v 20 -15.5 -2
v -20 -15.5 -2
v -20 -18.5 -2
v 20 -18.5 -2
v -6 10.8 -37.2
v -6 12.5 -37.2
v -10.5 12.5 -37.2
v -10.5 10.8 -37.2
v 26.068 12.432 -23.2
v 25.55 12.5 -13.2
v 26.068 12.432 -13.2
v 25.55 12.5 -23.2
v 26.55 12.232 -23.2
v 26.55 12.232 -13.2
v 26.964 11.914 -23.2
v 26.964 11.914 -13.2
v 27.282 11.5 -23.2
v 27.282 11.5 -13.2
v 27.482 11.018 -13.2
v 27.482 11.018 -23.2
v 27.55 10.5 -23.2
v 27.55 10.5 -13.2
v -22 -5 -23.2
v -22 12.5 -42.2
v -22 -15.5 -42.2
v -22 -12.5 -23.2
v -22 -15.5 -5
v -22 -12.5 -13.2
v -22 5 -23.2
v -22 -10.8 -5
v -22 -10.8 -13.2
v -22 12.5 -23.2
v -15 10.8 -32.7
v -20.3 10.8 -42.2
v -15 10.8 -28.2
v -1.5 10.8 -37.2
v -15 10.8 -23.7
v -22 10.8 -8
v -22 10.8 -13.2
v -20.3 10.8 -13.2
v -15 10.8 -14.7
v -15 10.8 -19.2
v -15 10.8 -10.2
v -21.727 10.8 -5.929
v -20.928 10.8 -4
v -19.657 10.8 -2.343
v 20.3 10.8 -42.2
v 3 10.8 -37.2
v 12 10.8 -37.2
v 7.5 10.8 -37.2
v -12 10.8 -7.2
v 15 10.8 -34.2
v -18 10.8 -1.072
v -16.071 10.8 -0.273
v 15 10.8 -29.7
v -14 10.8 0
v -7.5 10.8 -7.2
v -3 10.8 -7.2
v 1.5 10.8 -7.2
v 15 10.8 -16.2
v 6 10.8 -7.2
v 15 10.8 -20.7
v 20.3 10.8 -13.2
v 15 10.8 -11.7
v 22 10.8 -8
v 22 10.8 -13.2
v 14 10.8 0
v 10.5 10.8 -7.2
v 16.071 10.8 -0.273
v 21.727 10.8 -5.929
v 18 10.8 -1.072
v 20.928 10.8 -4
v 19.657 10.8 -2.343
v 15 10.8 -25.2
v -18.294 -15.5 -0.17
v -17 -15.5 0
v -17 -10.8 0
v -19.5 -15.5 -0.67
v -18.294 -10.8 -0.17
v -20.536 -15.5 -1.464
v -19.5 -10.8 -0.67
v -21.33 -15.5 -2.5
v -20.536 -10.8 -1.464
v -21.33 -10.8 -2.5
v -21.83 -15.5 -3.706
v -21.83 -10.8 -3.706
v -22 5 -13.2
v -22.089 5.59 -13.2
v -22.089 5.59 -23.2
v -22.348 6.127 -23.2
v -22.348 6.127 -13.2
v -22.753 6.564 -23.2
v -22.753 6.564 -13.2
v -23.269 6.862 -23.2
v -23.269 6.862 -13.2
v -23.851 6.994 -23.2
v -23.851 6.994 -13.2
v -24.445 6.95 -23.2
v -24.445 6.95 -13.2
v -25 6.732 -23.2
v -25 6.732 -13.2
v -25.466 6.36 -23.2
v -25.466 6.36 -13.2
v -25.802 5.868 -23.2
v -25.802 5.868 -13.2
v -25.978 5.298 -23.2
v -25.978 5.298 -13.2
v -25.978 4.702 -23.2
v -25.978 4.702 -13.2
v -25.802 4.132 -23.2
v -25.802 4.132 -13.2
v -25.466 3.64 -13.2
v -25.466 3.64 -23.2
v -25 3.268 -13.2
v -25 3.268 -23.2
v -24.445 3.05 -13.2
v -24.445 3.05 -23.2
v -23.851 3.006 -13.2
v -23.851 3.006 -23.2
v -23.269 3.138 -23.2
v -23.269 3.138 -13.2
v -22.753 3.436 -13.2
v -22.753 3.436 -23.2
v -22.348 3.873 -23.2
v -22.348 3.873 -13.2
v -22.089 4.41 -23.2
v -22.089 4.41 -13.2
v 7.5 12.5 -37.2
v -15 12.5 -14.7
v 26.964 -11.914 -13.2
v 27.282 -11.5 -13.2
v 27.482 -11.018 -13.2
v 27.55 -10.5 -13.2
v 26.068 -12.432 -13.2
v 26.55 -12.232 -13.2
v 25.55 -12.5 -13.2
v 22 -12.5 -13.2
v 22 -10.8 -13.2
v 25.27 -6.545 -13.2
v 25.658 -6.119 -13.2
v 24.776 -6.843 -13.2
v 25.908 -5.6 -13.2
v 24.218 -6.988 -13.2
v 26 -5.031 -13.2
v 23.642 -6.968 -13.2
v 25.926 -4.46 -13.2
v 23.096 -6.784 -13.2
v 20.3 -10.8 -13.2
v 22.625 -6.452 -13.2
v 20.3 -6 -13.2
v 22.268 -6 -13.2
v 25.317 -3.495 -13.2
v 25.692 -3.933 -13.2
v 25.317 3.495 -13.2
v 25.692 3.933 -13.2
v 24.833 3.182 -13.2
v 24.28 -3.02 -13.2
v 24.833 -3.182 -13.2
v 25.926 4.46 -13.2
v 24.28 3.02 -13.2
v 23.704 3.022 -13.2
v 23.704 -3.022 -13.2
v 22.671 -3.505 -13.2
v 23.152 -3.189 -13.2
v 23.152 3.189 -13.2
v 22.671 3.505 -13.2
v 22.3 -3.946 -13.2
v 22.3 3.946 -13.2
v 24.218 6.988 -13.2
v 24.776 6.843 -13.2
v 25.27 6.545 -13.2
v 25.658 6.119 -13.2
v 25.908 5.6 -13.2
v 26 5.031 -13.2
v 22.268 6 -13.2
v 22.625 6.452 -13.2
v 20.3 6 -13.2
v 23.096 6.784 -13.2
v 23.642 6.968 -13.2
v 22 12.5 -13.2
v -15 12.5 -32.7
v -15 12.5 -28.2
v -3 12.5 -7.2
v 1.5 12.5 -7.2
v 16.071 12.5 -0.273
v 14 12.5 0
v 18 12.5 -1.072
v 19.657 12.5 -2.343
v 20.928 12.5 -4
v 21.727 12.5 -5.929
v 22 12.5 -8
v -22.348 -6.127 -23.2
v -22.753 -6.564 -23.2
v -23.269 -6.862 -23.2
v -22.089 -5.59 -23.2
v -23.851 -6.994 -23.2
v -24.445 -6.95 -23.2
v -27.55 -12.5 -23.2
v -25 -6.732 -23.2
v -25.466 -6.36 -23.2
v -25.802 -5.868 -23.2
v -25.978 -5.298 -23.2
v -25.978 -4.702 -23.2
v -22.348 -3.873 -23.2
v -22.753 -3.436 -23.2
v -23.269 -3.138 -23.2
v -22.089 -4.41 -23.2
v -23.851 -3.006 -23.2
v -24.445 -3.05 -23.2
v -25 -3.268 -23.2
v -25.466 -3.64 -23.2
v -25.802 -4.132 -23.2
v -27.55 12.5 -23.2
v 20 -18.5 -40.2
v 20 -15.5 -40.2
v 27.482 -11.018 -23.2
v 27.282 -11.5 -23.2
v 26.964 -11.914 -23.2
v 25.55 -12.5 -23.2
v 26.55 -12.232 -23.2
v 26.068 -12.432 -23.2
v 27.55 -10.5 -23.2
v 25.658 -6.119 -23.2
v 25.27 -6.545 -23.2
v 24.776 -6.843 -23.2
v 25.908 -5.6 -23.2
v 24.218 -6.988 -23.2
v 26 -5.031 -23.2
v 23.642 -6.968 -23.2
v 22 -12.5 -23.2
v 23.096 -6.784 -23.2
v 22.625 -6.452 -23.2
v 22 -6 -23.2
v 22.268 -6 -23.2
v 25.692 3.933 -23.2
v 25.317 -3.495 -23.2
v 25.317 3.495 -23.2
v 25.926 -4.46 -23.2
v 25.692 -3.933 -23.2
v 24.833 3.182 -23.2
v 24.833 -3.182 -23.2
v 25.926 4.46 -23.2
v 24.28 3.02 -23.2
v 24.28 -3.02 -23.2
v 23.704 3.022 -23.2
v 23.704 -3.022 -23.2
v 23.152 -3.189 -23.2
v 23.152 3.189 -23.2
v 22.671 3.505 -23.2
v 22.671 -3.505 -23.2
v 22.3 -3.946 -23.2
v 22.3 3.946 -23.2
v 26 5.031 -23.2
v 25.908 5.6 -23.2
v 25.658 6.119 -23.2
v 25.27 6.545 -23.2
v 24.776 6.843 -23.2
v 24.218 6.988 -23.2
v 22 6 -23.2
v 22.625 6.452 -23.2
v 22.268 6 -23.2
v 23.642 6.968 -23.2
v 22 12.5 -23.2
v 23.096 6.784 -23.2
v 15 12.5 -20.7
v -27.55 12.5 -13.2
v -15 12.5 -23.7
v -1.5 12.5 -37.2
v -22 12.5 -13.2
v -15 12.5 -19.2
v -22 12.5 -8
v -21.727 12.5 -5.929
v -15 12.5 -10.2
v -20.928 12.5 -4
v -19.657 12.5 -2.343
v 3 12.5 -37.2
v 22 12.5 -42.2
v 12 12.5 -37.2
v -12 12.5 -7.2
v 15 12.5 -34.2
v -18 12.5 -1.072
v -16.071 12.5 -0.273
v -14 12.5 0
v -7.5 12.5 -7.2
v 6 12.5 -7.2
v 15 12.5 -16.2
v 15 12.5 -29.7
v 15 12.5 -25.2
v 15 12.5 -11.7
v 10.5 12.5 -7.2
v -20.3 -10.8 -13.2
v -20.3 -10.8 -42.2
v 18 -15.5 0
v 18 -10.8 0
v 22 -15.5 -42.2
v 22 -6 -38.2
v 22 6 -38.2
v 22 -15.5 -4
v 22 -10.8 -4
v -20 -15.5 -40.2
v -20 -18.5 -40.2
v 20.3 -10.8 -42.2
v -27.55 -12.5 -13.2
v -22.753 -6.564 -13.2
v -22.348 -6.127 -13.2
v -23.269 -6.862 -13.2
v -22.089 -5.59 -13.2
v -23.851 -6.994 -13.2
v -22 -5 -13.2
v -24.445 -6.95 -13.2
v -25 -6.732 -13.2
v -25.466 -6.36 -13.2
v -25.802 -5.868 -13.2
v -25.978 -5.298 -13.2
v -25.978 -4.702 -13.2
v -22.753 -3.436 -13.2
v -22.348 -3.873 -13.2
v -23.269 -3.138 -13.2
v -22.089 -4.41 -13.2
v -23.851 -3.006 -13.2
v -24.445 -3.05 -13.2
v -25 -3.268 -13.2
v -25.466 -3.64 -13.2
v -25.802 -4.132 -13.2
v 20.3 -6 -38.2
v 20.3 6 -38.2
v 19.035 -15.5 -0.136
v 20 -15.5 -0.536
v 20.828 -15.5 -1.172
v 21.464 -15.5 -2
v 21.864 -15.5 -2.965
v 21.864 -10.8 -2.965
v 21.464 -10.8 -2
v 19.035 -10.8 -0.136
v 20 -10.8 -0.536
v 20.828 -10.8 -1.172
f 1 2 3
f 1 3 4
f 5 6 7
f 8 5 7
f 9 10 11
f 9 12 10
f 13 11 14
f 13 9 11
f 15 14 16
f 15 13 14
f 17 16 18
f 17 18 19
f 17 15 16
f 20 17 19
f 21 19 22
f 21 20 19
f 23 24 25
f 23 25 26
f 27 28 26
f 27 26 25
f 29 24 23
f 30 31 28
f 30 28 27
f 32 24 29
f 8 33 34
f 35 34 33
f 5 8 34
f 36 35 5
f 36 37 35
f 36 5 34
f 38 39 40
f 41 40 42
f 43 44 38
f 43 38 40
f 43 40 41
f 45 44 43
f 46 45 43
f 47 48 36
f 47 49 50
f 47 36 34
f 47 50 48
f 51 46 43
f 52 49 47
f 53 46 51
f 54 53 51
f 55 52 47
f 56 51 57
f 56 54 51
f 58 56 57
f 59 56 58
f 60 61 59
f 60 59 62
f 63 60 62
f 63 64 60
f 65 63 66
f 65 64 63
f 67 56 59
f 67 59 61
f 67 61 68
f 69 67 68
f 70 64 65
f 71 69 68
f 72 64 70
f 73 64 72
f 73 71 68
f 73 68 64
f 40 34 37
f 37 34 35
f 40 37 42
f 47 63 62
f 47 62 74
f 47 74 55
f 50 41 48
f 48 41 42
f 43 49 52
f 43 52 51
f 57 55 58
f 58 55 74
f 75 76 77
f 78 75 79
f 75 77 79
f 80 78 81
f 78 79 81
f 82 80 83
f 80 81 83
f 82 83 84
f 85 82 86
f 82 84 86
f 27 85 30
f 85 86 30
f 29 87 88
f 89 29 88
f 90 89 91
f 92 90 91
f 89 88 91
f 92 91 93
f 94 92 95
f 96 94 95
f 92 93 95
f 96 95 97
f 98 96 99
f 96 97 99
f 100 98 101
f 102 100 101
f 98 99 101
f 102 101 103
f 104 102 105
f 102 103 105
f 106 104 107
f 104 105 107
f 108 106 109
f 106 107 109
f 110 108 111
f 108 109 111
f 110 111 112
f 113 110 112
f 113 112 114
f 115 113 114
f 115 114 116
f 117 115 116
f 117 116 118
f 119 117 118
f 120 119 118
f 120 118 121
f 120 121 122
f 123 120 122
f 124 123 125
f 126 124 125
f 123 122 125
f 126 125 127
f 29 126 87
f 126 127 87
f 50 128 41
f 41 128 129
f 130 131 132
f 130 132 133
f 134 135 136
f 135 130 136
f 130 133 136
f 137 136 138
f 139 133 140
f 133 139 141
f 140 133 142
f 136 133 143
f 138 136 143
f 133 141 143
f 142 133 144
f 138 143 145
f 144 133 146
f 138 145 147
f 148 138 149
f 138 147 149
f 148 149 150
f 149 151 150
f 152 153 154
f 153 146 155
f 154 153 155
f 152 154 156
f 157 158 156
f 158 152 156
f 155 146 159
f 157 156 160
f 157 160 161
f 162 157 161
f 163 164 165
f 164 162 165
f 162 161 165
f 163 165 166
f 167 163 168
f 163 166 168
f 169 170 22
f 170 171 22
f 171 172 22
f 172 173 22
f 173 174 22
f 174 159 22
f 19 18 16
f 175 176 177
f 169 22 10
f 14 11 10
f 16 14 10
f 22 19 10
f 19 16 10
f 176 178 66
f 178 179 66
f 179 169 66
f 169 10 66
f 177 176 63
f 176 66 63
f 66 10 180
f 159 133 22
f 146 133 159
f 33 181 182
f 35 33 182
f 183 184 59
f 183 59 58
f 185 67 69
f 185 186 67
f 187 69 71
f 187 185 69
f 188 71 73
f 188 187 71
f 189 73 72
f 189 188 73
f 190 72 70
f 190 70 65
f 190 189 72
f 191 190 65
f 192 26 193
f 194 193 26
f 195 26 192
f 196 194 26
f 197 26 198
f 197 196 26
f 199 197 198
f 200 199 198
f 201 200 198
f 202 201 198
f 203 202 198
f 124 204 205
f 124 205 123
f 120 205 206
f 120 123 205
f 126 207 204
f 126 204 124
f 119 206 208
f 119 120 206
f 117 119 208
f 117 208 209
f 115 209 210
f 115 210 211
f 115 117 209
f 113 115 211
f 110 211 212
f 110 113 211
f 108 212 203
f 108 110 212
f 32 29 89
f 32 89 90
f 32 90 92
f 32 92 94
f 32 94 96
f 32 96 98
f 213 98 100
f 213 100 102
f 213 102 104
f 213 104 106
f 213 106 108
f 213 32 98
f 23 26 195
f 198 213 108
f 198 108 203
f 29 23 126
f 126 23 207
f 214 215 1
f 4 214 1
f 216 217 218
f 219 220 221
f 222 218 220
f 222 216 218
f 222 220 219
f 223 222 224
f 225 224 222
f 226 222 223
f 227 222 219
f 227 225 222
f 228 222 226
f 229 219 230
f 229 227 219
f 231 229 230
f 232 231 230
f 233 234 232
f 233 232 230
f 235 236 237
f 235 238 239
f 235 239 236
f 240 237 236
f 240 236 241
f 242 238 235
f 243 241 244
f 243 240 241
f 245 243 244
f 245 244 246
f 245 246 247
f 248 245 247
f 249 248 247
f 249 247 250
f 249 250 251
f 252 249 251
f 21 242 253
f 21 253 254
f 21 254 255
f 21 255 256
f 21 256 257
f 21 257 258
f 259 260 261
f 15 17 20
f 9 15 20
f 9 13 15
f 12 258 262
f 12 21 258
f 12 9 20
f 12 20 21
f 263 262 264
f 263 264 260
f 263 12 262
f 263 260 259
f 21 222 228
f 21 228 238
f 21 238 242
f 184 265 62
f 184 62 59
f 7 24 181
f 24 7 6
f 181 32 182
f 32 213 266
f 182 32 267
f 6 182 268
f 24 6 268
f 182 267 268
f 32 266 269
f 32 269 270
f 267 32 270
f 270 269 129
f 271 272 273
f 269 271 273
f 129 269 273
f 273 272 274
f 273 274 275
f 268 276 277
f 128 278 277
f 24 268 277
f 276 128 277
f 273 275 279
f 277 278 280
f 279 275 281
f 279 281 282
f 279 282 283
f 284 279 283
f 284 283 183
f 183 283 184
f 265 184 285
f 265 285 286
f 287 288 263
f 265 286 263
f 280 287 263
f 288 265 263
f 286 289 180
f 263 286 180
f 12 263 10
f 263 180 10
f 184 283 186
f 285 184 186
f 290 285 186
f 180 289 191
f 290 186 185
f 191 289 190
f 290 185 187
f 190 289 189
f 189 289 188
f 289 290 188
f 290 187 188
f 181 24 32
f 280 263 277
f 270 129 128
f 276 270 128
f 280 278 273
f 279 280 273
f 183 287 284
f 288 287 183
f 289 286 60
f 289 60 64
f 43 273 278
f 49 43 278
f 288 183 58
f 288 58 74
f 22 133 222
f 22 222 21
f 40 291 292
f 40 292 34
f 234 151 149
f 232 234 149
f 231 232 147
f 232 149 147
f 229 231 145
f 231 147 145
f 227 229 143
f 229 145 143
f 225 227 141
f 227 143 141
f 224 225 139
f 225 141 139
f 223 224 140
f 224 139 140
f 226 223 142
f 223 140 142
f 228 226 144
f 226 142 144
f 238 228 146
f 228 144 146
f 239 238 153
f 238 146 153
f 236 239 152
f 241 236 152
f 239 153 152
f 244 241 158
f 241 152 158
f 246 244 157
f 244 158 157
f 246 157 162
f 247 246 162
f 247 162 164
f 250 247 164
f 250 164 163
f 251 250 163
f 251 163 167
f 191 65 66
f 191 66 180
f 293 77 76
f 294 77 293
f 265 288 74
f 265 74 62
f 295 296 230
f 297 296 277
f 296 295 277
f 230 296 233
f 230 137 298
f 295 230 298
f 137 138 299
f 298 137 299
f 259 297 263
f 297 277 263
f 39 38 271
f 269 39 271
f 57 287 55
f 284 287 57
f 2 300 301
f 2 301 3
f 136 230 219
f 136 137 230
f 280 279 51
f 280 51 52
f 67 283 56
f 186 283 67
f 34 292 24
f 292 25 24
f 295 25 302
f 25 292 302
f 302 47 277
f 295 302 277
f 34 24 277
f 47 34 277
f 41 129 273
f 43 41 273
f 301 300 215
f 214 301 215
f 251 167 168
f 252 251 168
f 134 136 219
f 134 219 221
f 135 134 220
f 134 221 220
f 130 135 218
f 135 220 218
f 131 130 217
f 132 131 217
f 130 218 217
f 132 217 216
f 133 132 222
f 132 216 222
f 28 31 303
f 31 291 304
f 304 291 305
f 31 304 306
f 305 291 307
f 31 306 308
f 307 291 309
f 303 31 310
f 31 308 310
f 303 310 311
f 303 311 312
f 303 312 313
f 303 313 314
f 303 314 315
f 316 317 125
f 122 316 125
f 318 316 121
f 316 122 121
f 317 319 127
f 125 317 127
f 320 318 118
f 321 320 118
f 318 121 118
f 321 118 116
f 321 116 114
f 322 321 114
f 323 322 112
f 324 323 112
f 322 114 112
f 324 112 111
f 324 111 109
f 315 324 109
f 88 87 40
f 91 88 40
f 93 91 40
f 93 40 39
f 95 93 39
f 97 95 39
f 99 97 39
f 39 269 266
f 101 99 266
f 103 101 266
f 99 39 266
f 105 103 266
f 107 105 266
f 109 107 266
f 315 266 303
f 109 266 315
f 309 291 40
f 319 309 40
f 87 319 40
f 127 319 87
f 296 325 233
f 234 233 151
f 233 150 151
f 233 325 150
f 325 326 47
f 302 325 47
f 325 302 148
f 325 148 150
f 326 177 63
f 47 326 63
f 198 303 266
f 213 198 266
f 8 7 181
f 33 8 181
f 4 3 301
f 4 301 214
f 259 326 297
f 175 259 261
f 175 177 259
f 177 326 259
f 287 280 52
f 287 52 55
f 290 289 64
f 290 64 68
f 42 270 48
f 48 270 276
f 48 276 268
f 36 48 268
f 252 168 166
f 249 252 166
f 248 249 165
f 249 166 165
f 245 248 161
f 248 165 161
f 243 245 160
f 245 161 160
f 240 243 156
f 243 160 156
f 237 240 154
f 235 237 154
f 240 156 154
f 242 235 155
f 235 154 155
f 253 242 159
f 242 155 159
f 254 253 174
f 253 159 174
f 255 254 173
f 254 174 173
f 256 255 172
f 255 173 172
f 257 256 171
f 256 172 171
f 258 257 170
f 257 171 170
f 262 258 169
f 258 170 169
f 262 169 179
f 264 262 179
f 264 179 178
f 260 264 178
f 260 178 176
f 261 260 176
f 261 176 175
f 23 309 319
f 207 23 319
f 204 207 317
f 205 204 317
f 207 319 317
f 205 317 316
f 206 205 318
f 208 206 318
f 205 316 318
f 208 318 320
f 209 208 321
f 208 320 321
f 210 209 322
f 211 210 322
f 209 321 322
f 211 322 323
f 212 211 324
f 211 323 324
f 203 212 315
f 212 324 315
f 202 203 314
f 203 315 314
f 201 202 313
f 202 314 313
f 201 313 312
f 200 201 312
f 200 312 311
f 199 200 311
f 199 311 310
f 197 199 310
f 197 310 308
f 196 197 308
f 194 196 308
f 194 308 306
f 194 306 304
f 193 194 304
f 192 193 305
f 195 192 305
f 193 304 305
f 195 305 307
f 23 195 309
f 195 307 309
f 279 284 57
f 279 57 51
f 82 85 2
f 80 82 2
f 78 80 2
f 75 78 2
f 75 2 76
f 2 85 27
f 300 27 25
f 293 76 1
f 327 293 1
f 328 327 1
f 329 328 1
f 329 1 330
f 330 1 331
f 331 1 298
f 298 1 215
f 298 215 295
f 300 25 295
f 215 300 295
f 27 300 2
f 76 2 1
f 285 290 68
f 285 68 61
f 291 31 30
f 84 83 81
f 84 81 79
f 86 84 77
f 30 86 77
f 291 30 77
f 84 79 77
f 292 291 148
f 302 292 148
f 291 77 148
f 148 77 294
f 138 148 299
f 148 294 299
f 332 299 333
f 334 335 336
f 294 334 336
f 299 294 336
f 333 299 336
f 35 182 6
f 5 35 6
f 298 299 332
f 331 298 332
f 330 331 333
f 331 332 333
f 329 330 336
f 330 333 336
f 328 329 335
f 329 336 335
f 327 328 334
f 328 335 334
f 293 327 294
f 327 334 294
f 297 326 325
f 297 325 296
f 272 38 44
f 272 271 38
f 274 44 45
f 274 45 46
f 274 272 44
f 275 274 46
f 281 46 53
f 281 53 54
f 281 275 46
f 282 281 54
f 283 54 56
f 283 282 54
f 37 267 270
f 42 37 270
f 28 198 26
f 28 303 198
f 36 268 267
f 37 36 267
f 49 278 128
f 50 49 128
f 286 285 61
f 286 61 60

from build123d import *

# Parameters (mm, degrees)
SKETCH_1_W           = 44
SKETCH_1_H           = 25
SKETCH_1_W_2         = 40.6
SKETCH_1_H_2         = 21.6
EXTRUDE_1_DEPTH      = 44.2
SKETCH_2_W           = 5.55
SKETCH_2_H           = 25
EXTRUDE_2_DEPTH      = 10
SKETCH_3_W           = 44
SKETCH_3_H           = 21.6
CUT_EXTRUDE_1_DEPTH  = 13.2
SKETCH_4_R           = 2
CUT_EXTRUDE_2_DEPTH  = 10
FILLET_1_R           = 2
SKETCH_5_W           = 44
SKETCH_5_H           = 44.2
EXTRUDE_3_DEPTH      = 6
SKETCH_9_R           = 1
EXTRUDE_4_DEPTH      = 2
EXTRUDE_5_DEPTH      = 1.5
SKETCH_12_R          = 35.05
SKETCH_12_R_2        = 32.9
CUT_EXTRUDE_6_DEPTH  = 1
SKETCH_13_R          = 1.5
CUT_EXTRUDE_7_DEPTH  = 30
SKETCH_14_W          = 2
SKETCH_14_H          = 12
CUT_EXTRUDE_8_DEPTH  = 25
FILLET_2_R           = 8
SKETCH_16_R          = 7.216878365
CUT_EXTRUDE_10_DEPTH = 10
FILLET_3_R           = 4
CUT_EXTRUDE_11_REACH = 107.631
SKETCH_17_W          = 44
SKETCH_17_H          = 2
SKETCH_21_W          = 227.693891034
SKETCH_21_H          = 191.913422443
CUT_EXTRUDE_15_DEPTH = 16
CUT_EXTRUDE_17_DEPTH = 10
SKETCH_31_W          = 40
SKETCH_31_H          = 38.2
EXTRUDE_10_DEPTH     = 3
CUT_EXTRUDE_18_DEPTH = 2


with BuildPart() as part:
    # 草图1 → 凸台-拉伸1 (new body)
    with BuildSketch(Plane.XY):
        Rectangle(SKETCH_1_W, SKETCH_1_H)
        Rectangle(SKETCH_1_W_2, SKETCH_1_H_2, mode=Mode.SUBTRACT)
    extrude(amount=-EXTRUDE_1_DEPTH)

    # 草图2 → 凸台-拉伸2 (add)
    with BuildSketch(Plane(origin=(0, 0, -13.2), x_dir=(-1, 0, 0), z_dir=(0, 0, -1))):
        with Locations((-24.775, 0)):
            Rectangle(SKETCH_2_W, SKETCH_2_H)
        with Locations((24.775, 0)):
            Rectangle(SKETCH_2_W, SKETCH_2_H)
    extrude(amount=EXTRUDE_2_DEPTH)

    # 草图3 → 切除-拉伸1 (cut)
    with BuildSketch(Plane.XY):
        Rectangle(SKETCH_3_W, SKETCH_3_H)
    extrude(amount=-CUT_EXTRUDE_1_DEPTH, mode=Mode.SUBTRACT)

    # 草图4 → 切除-拉伸2 (cut)
    with BuildSketch(Plane.XY.offset(-13.2)):
        with Locations((24, 5)):
            Circle(SKETCH_4_R)
        with Locations((24, -5)):
            Circle(SKETCH_4_R)
        with Locations((-24, 5)):
            Circle(SKETCH_4_R)
        with Locations((-24, -5)):
            Circle(SKETCH_4_R)
    extrude(amount=-CUT_EXTRUDE_2_DEPTH, mode=Mode.SUBTRACT)

    # 圆角1
    fillet_1_edges = [part.edges().sort_by_distance(p)[0] for p in [
        (27.55, 12.5, -18.2),
        (27.55, -12.5, -18.2),
    ]]
    fillet(fillet_1_edges, radius=FILLET_1_R)

    # 草图5 → 凸台-拉伸3 (add)
    with BuildSketch(Plane.XZ.offset(12.5)):
        with Locations((0, -22.1)):
            Rectangle(SKETCH_5_W, SKETCH_5_H)
    extrude(amount=EXTRUDE_3_DEPTH)

    # 草图9 → 凸台-拉伸4 (add)
    with BuildSketch(Plane.XZ.offset(18.5)):
        Polygon((-46.27864045, -52.2), (33.72135955, -52.2), (58.4427191, 23.884521304), (-6.27864045, 70.907341487), (-71, 23.884521304), align=None)
        with Locations(Location((-6.27864045, 2.855276819, 0), (0, 0, 270))):
            Circle(SKETCH_9_R, mode=Mode.SUBTRACT)
    extrude(amount=EXTRUDE_4_DEPTH)

    # 草图10 → 凸台-拉伸5 (add)
    with BuildSketch(Plane(origin=(0, -18.5, 0), x_dir=(1, 0, 0), z_dir=(0, 1, 0))):
        Polygon((-64.534362225, -21.783708242), (-6.27864045, -64.108967611), (51.977081325, -21.783708242), (29.725375646, 46.7), (-42.282656546, 46.7), align=None)
        Polygon((-62.183221216, -21.019776219), (-6.27864045, -61.636831656), (49.625940316, -21.019776219), (28.27229059, 44.7), (-40.82957149, 44.7), align=None, mode=Mode.SUBTRACT)
    extrude(amount=EXTRUDE_5_DEPTH)

    # 草图12 → 切除-拉伸6 (cut)
    with BuildSketch(Plane.XZ.offset(20.5)):
        with Locations(Location((-6.27864045, 2.855276819, 0), (0, 0, 270))):
            Circle(SKETCH_12_R)
        with Locations(Location((-6.27864045, 2.855276819, 0), (0, 0, 270))):
            Circle(SKETCH_12_R_2, mode=Mode.SUBTRACT)
    extrude(amount=-CUT_EXTRUDE_6_DEPTH, mode=Mode.SUBTRACT)

    # 草图13 → 切除-拉伸7 (cut)
    with BuildSketch(Plane.XZ.offset(20.5)):
        with Locations(Location((-6.27864045, 65.855276819, 0), (0, 0, 270))):
            Circle(SKETCH_13_R)
        with Locations(Location((53.637920077, 22.323347464, 0), (0, 0, 270))):
            Circle(SKETCH_13_R)
        with Locations(Location((30.751830444, -48.112793827, 0), (0, 0, 270))):
            Circle(SKETCH_13_R)
        with Locations(Location((-43.309111344, -48.112793827, 0), (0, 0, 270))):
            Circle(SKETCH_13_R)
        with Locations(Location((-66.195200977, 22.323347464, 0), (0, 0, 270))):
            Circle(SKETCH_13_R)
    extrude(amount=-CUT_EXTRUDE_7_DEPTH, mode=Mode.SUBTRACT)

    # 草图14 → 切除-拉伸8 (cut)
    with BuildSketch(Plane.XY.offset(-13.2)):
        with Locations((21.3, 0)):
            Rectangle(SKETCH_14_W, SKETCH_14_H)
    extrude(amount=-CUT_EXTRUDE_8_DEPTH, mode=Mode.SUBTRACT)

    # 圆角2
    fillet_2_edges = [part.edges().sort_by_distance(p)[0] for p in [
        (-22, 11.65, 0),
        (22, 11.65, 0),
    ]]
    fillet(fillet_2_edges, radius=FILLET_2_R)

    # 草图16 → 切除-拉伸10 (cut)
    with BuildSketch(Plane(origin=(0, -18.5, 0), x_dir=(1, 0, 0), z_dir=(0, 1, 0))):
        with Locations(Location((-14.634879376, -12.813854579, 0), (0, 0, 270))):
            Circle(SKETCH_16_R)
    extrude(amount=-CUT_EXTRUDE_10_DEPTH, mode=Mode.SUBTRACT)

    # 圆角3
    fillet_3_edges = [part.edges().sort_by_distance(p)[0] for p in [
        (-22, -14.65, 0),
        (22, -14.65, 0),
    ]]
    fillet(fillet_3_edges, radius=FILLET_3_R)

    # 切除-拉伸11: up to this face of the body (flat: up to its plane)
    cut_extrude_11_end = Plane(part.part.faces().sort_by_distance((23.543010381, -18.5, -24.1))[0])
    # 草图17 → 切除-拉伸11 (cut, up to the picked face)
    with BuildSketch(Plane(origin=(0, 12.5, 0), x_dir=(1, 0, 0), z_dir=(0, 1, 0)), mode=Mode.PRIVATE) as cut_extrude_11_sk1:
        with Locations((0, 43.2)):
            Rectangle(SKETCH_17_W, SKETCH_17_H)
    cut_extrude_11_tool1 = split(extrude(cut_extrude_11_sk1.sketch, amount=-CUT_EXTRUDE_11_REACH, mode=Mode.PRIVATE), bisect_by=cut_extrude_11_end, keep=Keep.BOTH, mode=Mode.PRIVATE)
    add(cut_extrude_11_tool1.solids().sort_by(Axis((0, 12.5, -43.2), (0, -1, 0)))[0], mode=Mode.SUBTRACT)

    # 草图21 → 切除-拉伸15 (cut)
    with BuildSketch(Plane(origin=(0, -15.5, 0), x_dir=(1, 0, 0), z_dir=(0, 1, 0))):
        with Locations((-2.520580865, -1.129519683)):
            Rectangle(SKETCH_21_W, SKETCH_21_H)
    extrude(amount=-CUT_EXTRUDE_15_DEPTH, mode=Mode.SUBTRACT)

    # 草图25 → 切除-拉伸17 (cut)
    with BuildSketch(Plane(origin=(0, -10.8, 0), x_dir=(1, 0, 0), z_dir=(0, 1, 0))):
        with BuildLine():
            Line((-22, 5), (-22, 0))
            Line((-22, 0), (-17, 0))
            ThreePointArc((-17, 0), (-20.535533906, 1.464466094), (-22, 5))
        make_face()
    extrude(amount=-CUT_EXTRUDE_17_DEPTH, mode=Mode.SUBTRACT)

    # 草图31 → 凸台-拉伸10 (add)
    with BuildSketch(Plane.XZ.offset(15.5)):
        with Locations((0, -21.1)):
            Rectangle(SKETCH_31_W, SKETCH_31_H)
    extrude(amount=EXTRUDE_10_DEPTH)

    # 草图32 → 切除-拉伸18 (cut)
    with BuildSketch(Plane(origin=(0, 12.5, 0), x_dir=(1, 0, 0), z_dir=(0, 1, 0))):
        Polygon((-10.5, 37.2), (-15, 32.7), (-15, 28.2), (-6, 37.2), align=None)
        Polygon((-1.5, 37.2), (-15, 23.7), (-15, 19.2), (3, 37.2), align=None)
        Polygon((7.5, 37.2), (-15, 14.7), (-15, 10.2), (12, 37.2), align=None)
        Polygon((-7.5, 7.2), (-12, 7.2), (15, 34.2), (15, 29.7), align=None)
        Polygon((1.5, 7.2), (-3, 7.2), (15, 25.2), (15, 20.7), align=None)
        Polygon((15, 16.2), (15, 11.7), (10.5, 7.2), (6, 7.2), align=None)
    extrude(amount=-CUT_EXTRUDE_18_DEPTH, mode=Mode.SUBTRACT)


solid = part.part
